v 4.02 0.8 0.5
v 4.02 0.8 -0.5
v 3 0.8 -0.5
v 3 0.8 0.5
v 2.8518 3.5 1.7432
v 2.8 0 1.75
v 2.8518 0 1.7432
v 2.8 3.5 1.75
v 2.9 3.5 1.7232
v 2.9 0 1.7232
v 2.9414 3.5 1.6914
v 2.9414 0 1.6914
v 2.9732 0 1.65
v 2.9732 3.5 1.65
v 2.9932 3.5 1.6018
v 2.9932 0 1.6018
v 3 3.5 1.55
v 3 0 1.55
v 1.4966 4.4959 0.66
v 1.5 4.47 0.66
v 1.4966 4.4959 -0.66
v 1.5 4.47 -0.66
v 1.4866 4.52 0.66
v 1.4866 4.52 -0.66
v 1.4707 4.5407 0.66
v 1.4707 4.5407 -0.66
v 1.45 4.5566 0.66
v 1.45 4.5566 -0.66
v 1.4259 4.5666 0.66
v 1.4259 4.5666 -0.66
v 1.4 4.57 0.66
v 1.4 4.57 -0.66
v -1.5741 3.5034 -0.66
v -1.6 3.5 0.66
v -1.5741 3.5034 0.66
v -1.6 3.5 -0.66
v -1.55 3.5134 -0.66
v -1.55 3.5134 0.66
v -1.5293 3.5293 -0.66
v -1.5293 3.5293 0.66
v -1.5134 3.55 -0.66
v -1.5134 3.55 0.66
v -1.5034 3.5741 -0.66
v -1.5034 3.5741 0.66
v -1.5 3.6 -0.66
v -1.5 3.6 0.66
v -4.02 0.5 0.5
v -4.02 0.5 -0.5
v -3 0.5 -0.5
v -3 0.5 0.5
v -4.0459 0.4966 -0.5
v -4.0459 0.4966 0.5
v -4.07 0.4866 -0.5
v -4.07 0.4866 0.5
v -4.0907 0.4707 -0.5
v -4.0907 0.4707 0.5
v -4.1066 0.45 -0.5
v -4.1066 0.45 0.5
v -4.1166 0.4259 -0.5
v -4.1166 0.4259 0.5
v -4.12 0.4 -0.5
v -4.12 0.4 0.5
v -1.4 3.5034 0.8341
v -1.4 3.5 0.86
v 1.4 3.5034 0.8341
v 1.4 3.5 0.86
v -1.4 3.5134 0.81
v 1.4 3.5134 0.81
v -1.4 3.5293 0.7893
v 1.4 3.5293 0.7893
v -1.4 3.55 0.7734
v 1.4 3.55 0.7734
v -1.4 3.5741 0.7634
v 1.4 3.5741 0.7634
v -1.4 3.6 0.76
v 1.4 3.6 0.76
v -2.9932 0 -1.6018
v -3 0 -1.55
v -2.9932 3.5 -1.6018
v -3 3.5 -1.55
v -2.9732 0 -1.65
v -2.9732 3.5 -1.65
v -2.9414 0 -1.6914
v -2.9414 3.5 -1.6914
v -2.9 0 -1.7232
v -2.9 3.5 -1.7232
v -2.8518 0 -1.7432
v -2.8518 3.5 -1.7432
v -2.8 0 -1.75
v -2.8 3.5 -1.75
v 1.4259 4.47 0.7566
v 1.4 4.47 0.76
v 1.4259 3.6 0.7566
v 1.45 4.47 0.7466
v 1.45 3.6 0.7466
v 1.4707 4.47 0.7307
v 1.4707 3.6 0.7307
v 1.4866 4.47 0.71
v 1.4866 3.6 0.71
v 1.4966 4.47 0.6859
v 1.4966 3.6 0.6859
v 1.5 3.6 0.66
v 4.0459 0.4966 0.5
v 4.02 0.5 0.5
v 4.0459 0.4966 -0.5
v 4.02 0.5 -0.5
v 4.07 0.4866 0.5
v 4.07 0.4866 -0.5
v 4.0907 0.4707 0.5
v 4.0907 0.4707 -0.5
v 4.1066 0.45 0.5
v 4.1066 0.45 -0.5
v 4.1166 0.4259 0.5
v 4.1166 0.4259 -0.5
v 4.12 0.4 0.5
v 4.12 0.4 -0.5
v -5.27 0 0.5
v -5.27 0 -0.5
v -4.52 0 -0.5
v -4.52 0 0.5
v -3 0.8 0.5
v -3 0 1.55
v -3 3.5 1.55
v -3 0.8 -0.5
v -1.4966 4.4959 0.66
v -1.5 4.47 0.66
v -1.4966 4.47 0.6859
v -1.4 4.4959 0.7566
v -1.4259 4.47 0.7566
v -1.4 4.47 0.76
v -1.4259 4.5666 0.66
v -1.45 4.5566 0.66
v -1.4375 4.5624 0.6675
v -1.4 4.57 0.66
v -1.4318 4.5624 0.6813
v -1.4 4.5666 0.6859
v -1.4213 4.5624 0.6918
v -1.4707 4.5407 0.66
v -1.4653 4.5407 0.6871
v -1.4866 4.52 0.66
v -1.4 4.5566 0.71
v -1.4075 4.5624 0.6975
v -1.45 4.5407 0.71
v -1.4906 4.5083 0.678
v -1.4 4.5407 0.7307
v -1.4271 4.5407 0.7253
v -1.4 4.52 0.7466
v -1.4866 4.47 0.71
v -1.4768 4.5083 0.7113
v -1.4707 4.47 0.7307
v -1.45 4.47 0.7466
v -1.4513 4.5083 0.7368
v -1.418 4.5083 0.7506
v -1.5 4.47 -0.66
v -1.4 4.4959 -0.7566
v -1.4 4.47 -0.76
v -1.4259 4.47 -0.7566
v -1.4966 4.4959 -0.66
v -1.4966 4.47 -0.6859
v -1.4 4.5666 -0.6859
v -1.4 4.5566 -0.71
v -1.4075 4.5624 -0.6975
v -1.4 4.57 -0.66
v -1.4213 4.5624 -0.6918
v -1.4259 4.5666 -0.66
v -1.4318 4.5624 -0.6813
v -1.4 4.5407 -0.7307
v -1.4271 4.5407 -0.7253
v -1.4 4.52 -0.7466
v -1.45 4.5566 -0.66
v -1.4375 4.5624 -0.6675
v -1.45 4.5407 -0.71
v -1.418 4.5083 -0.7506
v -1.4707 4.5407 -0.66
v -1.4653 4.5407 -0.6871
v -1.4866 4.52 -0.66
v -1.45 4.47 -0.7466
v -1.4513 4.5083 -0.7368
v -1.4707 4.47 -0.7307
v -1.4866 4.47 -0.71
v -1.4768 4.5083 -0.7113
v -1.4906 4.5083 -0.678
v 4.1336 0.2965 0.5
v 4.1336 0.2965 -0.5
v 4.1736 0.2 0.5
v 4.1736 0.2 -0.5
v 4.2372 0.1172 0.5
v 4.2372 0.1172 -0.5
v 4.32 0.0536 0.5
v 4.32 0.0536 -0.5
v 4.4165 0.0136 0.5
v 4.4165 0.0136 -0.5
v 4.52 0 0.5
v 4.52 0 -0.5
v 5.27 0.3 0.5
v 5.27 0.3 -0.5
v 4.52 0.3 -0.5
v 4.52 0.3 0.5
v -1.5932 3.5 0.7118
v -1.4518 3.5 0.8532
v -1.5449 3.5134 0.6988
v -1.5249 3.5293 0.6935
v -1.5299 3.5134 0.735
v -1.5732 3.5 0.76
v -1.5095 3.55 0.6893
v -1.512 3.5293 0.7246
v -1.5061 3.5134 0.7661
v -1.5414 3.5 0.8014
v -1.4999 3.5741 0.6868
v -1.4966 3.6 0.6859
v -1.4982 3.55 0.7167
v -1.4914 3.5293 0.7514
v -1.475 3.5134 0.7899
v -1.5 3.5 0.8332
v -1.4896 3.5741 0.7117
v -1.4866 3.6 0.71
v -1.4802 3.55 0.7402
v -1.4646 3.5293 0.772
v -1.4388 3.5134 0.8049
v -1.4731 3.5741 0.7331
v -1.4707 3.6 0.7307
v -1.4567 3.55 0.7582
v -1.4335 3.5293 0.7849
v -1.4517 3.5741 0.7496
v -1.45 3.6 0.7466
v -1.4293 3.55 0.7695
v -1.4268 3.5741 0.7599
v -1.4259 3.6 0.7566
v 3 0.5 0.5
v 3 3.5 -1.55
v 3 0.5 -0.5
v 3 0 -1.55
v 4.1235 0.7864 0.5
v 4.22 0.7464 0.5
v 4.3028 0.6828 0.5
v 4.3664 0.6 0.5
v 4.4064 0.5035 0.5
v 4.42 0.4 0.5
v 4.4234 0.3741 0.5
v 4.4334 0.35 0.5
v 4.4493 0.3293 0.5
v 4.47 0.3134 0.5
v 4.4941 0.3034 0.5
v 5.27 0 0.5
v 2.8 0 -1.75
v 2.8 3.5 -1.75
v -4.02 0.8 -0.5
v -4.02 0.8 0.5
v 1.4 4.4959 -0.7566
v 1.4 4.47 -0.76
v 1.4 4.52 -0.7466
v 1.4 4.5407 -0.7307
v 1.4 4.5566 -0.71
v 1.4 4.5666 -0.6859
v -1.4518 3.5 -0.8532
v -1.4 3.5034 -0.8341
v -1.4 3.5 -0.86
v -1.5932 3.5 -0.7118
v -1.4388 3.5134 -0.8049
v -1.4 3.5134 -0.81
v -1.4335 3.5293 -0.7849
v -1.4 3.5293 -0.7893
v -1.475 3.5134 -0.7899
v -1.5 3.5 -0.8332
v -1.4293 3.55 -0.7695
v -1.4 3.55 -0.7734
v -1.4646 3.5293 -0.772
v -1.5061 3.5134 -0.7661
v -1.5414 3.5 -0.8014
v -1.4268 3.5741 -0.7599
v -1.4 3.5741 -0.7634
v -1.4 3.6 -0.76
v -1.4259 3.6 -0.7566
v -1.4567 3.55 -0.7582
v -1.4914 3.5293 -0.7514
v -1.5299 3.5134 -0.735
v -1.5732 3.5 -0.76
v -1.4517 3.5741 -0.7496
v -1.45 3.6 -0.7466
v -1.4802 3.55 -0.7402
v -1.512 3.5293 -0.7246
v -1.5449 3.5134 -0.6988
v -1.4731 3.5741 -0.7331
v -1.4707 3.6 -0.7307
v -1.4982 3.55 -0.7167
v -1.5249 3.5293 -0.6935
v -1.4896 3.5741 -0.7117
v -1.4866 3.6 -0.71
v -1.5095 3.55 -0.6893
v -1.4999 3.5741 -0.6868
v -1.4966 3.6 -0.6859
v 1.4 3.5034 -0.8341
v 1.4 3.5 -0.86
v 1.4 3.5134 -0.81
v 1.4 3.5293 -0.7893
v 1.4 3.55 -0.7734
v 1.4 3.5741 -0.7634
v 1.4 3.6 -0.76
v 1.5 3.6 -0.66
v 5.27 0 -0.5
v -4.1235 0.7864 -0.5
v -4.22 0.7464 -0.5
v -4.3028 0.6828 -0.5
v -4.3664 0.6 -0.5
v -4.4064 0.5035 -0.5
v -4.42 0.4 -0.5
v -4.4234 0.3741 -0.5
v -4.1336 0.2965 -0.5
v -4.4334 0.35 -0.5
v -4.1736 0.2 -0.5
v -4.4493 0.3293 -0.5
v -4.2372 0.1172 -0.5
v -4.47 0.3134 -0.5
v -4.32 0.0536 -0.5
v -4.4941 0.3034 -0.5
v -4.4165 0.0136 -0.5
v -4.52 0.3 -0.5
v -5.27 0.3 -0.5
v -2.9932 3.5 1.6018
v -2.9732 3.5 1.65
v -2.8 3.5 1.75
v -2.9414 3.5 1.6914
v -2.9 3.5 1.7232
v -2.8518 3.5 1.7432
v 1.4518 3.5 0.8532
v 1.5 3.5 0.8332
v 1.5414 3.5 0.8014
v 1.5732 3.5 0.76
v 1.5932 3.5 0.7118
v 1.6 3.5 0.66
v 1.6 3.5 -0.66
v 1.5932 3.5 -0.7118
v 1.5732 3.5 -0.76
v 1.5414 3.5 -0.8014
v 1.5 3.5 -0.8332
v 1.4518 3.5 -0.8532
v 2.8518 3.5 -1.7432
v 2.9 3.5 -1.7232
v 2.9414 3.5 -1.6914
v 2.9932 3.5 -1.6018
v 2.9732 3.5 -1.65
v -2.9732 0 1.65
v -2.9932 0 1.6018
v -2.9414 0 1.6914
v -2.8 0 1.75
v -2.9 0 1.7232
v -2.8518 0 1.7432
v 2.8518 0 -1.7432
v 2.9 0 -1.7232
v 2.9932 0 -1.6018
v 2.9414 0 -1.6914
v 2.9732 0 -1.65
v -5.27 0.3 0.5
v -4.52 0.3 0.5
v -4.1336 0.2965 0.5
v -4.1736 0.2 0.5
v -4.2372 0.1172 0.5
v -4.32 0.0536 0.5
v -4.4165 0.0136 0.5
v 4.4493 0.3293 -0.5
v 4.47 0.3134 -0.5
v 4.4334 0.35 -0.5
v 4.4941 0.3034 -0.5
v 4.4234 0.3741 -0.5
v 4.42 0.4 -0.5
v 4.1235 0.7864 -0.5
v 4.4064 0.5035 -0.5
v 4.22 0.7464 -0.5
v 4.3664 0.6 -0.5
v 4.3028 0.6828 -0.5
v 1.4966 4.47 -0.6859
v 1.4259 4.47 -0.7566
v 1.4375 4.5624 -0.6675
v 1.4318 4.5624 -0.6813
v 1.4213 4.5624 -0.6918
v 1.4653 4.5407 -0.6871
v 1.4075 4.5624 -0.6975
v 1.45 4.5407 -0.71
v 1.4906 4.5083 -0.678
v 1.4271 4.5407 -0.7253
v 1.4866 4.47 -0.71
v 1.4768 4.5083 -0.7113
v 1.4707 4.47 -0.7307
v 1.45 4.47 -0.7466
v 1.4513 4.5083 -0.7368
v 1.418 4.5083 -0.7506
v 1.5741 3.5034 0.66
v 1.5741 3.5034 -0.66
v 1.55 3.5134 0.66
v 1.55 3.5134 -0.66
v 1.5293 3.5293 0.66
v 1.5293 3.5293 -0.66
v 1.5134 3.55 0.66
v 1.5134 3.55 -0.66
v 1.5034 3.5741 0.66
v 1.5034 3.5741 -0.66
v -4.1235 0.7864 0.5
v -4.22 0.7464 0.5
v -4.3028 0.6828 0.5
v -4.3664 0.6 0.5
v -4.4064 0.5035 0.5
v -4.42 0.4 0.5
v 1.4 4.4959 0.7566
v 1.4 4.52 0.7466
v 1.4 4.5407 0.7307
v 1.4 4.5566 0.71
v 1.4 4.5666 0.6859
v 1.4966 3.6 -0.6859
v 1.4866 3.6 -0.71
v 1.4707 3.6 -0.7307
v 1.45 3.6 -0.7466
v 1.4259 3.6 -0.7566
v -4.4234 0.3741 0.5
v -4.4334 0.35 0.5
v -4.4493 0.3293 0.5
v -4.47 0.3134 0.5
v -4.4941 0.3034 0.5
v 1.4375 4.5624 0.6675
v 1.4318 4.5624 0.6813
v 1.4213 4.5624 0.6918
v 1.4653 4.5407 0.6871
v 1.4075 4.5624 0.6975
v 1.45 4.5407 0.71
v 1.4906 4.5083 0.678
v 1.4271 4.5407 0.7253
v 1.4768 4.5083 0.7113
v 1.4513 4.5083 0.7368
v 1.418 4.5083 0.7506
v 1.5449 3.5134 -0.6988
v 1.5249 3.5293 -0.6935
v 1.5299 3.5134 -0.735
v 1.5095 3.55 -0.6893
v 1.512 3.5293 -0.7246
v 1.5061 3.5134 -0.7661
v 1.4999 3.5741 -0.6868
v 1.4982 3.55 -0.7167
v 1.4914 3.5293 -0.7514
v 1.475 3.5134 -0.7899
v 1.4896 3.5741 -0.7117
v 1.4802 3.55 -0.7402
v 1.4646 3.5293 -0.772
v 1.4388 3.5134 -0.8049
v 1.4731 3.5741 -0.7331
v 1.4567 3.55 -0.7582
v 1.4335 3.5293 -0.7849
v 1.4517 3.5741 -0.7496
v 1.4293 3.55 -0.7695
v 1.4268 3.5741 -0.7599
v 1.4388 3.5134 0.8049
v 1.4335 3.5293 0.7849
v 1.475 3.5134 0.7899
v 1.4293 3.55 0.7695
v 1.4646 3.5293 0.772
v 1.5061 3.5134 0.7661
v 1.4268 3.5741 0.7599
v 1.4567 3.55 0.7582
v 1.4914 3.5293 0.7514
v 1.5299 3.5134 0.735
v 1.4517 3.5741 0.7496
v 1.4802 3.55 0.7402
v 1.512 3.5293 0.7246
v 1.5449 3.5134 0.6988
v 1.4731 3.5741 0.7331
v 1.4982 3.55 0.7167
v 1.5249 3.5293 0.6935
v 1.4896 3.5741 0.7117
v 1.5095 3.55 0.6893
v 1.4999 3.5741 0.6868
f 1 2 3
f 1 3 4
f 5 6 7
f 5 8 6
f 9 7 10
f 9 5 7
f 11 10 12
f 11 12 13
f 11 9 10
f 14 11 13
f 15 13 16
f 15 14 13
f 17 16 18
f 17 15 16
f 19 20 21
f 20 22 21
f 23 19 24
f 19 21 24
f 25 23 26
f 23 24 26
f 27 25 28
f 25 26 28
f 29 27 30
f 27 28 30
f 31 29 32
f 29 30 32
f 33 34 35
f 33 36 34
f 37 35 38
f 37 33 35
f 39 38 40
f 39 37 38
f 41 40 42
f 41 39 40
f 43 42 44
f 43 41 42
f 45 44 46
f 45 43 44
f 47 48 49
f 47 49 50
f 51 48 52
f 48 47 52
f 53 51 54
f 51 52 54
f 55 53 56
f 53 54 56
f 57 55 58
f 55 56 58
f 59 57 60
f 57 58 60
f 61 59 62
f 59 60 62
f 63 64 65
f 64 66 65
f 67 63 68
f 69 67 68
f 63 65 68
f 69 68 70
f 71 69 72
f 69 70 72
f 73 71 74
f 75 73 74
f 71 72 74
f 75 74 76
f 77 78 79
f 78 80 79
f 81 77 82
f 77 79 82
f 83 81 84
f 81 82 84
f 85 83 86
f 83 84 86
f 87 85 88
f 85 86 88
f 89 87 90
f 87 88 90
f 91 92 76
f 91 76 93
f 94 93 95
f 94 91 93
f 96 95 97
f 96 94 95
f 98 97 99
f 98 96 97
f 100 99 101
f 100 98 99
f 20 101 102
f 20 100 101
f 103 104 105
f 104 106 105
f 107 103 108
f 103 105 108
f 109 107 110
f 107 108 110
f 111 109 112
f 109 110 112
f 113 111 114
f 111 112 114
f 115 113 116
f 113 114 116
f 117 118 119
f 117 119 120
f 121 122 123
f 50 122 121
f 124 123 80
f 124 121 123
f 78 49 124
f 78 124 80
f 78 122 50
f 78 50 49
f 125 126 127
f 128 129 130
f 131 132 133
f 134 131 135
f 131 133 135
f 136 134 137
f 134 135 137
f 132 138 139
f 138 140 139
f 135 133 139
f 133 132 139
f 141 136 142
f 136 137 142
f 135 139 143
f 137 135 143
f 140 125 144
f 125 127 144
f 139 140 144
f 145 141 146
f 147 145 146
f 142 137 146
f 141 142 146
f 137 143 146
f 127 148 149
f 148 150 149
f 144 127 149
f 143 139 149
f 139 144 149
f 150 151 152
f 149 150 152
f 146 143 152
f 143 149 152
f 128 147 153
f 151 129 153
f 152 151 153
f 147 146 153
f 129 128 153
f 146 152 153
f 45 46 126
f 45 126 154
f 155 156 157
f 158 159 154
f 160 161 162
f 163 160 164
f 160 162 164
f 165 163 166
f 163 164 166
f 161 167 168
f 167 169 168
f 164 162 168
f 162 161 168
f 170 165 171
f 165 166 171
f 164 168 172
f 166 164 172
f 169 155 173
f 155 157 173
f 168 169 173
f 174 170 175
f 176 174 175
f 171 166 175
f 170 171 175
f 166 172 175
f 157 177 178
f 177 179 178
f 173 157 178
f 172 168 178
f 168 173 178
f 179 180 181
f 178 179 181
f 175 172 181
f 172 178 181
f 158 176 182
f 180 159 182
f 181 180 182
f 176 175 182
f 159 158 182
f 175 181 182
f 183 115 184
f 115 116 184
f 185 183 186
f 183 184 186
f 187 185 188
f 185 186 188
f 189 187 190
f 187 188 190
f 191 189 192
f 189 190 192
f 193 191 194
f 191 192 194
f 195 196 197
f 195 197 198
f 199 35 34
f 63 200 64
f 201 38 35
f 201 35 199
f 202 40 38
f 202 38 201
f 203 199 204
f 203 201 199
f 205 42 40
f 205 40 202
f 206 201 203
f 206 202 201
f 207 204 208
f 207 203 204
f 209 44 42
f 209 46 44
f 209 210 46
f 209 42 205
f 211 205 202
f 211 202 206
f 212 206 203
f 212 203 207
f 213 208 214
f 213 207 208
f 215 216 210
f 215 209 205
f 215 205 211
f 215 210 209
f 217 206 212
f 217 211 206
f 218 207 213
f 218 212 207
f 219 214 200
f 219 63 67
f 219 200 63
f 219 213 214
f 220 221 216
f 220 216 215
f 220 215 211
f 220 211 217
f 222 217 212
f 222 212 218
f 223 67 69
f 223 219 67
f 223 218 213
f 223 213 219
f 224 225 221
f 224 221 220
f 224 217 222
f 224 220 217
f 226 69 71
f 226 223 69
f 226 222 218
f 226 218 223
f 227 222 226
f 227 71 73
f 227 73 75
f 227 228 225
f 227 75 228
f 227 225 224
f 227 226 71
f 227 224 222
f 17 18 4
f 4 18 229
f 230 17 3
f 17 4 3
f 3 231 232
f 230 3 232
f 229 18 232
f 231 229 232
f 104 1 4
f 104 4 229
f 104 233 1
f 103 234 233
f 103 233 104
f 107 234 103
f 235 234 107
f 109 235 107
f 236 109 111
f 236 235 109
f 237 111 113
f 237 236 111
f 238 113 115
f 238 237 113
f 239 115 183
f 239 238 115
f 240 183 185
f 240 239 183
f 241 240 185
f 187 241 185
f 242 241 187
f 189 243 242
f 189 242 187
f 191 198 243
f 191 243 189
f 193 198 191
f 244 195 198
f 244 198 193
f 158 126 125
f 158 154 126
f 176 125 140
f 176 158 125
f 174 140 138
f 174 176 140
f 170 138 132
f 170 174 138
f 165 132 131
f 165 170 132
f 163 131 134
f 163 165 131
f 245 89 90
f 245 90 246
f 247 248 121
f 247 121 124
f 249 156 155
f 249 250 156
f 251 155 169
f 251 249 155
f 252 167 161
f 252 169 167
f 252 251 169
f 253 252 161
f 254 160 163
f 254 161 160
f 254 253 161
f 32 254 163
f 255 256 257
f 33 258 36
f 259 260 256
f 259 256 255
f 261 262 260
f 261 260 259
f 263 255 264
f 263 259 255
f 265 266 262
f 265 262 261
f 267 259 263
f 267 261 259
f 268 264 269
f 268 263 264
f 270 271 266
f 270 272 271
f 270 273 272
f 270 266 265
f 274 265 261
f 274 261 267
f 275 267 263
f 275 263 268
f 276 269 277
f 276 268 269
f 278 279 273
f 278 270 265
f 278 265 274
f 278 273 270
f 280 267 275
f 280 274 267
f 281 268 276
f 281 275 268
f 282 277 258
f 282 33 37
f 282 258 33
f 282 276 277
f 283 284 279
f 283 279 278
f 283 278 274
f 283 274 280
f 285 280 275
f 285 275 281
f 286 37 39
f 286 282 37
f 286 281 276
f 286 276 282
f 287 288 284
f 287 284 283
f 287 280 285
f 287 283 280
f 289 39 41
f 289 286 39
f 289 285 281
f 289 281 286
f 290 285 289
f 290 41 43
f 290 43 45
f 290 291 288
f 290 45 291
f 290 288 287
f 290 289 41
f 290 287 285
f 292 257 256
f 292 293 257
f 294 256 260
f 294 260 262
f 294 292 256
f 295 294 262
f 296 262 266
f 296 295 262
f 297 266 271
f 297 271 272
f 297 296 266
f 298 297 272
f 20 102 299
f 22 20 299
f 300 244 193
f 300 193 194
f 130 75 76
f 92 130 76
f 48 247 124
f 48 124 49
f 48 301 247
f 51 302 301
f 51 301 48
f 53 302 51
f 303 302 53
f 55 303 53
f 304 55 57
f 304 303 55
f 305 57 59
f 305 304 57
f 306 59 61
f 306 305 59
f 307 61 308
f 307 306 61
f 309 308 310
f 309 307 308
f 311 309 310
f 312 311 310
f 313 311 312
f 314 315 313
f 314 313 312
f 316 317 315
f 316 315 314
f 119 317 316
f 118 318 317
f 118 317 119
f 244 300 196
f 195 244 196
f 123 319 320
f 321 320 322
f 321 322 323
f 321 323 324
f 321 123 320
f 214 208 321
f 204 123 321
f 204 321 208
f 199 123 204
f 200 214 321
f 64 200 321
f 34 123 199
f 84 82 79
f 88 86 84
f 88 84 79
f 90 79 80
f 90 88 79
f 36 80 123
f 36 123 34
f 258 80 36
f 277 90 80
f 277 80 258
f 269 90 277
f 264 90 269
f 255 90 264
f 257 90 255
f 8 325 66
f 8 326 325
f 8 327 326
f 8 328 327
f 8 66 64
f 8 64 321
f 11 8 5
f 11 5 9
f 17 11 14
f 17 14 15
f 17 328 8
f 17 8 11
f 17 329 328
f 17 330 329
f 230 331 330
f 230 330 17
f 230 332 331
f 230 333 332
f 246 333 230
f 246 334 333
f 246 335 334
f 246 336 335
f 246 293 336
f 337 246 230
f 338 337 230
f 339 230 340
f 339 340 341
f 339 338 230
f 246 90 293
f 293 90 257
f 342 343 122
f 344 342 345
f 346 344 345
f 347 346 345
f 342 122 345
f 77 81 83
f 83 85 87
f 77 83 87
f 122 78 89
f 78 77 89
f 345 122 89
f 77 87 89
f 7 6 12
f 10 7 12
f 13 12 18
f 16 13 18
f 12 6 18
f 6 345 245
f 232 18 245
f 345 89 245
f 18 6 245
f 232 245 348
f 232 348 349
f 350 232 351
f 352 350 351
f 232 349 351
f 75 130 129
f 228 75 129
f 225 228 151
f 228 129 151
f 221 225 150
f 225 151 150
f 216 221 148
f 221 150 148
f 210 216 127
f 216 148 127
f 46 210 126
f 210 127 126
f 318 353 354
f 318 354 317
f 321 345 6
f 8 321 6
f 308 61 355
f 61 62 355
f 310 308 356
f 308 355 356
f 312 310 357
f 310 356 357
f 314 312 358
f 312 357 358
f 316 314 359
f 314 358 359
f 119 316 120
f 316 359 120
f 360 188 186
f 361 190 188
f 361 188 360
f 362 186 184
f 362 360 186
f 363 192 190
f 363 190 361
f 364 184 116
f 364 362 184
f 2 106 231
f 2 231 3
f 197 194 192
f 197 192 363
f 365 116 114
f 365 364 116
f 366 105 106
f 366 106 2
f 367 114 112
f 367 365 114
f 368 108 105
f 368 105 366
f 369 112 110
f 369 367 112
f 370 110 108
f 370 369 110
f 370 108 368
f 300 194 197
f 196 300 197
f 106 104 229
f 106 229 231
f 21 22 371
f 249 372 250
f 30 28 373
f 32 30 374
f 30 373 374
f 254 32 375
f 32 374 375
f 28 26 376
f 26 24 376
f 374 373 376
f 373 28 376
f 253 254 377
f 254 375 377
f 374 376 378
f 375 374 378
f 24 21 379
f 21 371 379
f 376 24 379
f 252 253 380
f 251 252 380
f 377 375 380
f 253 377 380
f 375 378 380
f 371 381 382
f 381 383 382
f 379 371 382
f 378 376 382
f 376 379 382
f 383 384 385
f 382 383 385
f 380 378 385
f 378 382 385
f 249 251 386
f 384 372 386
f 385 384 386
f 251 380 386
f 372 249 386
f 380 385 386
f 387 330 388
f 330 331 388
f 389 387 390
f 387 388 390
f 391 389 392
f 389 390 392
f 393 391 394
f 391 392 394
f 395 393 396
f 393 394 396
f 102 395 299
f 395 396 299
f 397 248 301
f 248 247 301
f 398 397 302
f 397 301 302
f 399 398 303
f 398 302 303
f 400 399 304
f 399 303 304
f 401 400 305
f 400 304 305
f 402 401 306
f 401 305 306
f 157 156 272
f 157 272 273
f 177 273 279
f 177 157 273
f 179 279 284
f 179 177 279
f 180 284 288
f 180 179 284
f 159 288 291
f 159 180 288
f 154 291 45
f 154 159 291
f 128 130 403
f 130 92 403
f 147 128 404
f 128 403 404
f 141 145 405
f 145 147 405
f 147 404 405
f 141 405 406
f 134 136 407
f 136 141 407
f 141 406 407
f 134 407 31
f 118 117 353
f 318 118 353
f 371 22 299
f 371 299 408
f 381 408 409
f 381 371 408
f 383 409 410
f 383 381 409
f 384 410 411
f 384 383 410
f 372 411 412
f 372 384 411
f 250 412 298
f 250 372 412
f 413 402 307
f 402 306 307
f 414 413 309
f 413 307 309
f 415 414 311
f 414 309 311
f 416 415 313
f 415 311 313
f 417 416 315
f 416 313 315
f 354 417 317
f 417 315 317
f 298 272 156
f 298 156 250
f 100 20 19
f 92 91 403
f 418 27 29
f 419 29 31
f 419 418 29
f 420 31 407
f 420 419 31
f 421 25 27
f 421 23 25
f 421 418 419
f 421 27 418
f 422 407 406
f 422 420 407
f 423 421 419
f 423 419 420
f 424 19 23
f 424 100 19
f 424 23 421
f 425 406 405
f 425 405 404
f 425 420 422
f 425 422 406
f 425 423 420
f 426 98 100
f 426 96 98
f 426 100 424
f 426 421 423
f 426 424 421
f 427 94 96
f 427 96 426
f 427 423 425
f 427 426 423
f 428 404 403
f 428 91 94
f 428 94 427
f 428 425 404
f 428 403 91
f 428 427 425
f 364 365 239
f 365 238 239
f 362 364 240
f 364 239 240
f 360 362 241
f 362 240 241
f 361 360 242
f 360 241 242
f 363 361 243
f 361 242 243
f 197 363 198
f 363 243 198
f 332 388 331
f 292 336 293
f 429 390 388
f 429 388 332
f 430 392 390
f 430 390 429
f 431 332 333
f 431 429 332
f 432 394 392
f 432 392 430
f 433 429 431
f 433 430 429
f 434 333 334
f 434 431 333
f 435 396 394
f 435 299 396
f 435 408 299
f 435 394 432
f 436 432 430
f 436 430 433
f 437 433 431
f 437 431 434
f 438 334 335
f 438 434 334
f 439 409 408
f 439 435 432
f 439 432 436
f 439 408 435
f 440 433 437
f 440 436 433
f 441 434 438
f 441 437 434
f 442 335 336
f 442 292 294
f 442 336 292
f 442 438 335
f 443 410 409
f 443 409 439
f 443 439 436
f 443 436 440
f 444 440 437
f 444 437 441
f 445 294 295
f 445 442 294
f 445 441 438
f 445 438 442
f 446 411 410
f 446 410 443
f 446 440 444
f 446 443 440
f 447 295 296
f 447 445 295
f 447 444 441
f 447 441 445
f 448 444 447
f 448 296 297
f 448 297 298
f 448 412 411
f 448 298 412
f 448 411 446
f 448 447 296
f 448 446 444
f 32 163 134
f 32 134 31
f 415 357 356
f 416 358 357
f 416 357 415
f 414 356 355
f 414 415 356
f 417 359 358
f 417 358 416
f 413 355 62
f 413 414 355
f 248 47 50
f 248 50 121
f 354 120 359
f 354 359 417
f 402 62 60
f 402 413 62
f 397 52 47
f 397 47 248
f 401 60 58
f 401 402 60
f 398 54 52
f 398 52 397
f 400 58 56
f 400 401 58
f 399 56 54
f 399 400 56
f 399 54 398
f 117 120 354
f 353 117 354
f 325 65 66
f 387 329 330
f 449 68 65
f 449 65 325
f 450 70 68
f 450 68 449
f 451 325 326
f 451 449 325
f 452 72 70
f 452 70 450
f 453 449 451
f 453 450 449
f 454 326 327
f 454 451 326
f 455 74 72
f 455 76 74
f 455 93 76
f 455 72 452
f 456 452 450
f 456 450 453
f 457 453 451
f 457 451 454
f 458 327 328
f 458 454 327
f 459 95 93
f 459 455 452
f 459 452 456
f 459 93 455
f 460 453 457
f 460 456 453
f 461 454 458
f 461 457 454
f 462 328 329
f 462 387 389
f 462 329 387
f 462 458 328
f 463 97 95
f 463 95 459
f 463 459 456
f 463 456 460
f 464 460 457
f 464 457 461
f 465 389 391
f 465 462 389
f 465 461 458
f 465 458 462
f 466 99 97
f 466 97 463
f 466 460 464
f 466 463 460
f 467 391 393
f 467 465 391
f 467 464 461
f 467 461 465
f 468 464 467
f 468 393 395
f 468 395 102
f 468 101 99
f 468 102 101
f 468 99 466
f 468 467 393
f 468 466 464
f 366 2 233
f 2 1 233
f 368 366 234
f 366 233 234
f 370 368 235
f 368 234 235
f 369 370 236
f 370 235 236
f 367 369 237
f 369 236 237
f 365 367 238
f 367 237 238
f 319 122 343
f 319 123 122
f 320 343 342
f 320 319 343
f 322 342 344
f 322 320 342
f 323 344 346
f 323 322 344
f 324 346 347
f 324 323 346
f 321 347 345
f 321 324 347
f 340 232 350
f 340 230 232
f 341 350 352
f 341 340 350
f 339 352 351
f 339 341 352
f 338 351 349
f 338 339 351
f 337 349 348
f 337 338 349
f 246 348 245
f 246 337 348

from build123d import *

# Parameters (mm, degrees)
SKETCH1_W           = 6
SKETCH1_H           = 3.5
BOSS_EXTRUDE1_DEPTH = 3.5
FILLET1_R           = 0.2
SKETCH2_W           = 3
SKETCH2_H           = 1.52
BOSS_EXTRUDE2_DEPTH = 1.07
FILLET2_R           = 0.1
SKETCH3_W           = 1
SKETCH3_H           = 0.3
CIRPATTERN1_COUNT   = 2


with BuildPart() as part:
    # Sketch1 → Boss-Extrude1 (new body)
    with BuildSketch(Plane(origin=(0, 0, 0), x_dir=(1, 0, 0), z_dir=(0, 1, 0))):
        Rectangle(SKETCH1_W, SKETCH1_H)
    extrude(amount=BOSS_EXTRUDE1_DEPTH)

    # Fillet1
    fillet1_edges = [part.edges().sort_by_distance(p)[0] for p in [
        (-3, 1.75, -1.75),
        (3, 1.75, -1.75),
        (3, 1.75, 1.75),
        (-3, 1.75, 1.75),
    ]]
    fillet(fillet1_edges, radius=FILLET1_R)

    # Sketch2 → Boss-Extrude2 (add)
    with BuildSketch(Plane(origin=(0, 3.5, 0), x_dir=(1, 0, 0), z_dir=(0, 1, 0))):
        Rectangle(SKETCH2_W, SKETCH2_H)
    extrude(amount=BOSS_EXTRUDE2_DEPTH)

    # Fillet2
    fillet2_edges = [part.edges().sort_by_distance(p)[0] for p in [
        (1.5, 3.5, 0),
        (1.5, 4.035, 0.76),
        (0, 3.5, -0.76),
        (1.5, 4.035, -0.76),
        (-1.5, 3.5, 0),
        (-1.5, 4.035, -0.76),
        (0, 3.5, 0.76),
        (-1.5, 4.035, 0.76),
        (1.5, 4.57, 0),
        (0, 4.57, -0.76),
        (-1.5, 4.57, 0),
        (0, 4.57, 0.76),
    ]]
    fillet(fillet2_edges, radius=FILLET2_R)

    # Sweep1: sweep along a path in Sketch4
    with BuildLine(Plane.XY) as sweep1_path:
        Line((3, 0.65), (4.02, 0.65))
        ThreePointArc((4.02, 0.65), (4.196776695, 0.576776695), (4.27, 0.4))
        ThreePointArc((4.27, 0.4), (4.343223305, 0.223223305), (4.52, 0.15))
        Line((4.52, 0.15), (5.27, 0.15))
    # Sketch3 → Sweep1 (sweep)
    with BuildSketch(Plane(origin=(3, 0, 0), x_dir=(0, 0, -1), z_dir=(1, 0, 0))):
        with Locations((0, 0.65)):
            Rectangle(SKETCH3_W, SKETCH3_H)
    sweep1 = sweep(path=sweep1_path.line)

    # CirPattern1: Sweep1 ×2 about axis
    cirpattern1_axis = Axis((0, 4.7985, 0), (0, -1, 0))
    for i in range(1, CIRPATTERN1_COUNT):
        add(sweep1.rotate(cirpattern1_axis, i * 360 / CIRPATTERN1_COUNT))


solid = part.part
